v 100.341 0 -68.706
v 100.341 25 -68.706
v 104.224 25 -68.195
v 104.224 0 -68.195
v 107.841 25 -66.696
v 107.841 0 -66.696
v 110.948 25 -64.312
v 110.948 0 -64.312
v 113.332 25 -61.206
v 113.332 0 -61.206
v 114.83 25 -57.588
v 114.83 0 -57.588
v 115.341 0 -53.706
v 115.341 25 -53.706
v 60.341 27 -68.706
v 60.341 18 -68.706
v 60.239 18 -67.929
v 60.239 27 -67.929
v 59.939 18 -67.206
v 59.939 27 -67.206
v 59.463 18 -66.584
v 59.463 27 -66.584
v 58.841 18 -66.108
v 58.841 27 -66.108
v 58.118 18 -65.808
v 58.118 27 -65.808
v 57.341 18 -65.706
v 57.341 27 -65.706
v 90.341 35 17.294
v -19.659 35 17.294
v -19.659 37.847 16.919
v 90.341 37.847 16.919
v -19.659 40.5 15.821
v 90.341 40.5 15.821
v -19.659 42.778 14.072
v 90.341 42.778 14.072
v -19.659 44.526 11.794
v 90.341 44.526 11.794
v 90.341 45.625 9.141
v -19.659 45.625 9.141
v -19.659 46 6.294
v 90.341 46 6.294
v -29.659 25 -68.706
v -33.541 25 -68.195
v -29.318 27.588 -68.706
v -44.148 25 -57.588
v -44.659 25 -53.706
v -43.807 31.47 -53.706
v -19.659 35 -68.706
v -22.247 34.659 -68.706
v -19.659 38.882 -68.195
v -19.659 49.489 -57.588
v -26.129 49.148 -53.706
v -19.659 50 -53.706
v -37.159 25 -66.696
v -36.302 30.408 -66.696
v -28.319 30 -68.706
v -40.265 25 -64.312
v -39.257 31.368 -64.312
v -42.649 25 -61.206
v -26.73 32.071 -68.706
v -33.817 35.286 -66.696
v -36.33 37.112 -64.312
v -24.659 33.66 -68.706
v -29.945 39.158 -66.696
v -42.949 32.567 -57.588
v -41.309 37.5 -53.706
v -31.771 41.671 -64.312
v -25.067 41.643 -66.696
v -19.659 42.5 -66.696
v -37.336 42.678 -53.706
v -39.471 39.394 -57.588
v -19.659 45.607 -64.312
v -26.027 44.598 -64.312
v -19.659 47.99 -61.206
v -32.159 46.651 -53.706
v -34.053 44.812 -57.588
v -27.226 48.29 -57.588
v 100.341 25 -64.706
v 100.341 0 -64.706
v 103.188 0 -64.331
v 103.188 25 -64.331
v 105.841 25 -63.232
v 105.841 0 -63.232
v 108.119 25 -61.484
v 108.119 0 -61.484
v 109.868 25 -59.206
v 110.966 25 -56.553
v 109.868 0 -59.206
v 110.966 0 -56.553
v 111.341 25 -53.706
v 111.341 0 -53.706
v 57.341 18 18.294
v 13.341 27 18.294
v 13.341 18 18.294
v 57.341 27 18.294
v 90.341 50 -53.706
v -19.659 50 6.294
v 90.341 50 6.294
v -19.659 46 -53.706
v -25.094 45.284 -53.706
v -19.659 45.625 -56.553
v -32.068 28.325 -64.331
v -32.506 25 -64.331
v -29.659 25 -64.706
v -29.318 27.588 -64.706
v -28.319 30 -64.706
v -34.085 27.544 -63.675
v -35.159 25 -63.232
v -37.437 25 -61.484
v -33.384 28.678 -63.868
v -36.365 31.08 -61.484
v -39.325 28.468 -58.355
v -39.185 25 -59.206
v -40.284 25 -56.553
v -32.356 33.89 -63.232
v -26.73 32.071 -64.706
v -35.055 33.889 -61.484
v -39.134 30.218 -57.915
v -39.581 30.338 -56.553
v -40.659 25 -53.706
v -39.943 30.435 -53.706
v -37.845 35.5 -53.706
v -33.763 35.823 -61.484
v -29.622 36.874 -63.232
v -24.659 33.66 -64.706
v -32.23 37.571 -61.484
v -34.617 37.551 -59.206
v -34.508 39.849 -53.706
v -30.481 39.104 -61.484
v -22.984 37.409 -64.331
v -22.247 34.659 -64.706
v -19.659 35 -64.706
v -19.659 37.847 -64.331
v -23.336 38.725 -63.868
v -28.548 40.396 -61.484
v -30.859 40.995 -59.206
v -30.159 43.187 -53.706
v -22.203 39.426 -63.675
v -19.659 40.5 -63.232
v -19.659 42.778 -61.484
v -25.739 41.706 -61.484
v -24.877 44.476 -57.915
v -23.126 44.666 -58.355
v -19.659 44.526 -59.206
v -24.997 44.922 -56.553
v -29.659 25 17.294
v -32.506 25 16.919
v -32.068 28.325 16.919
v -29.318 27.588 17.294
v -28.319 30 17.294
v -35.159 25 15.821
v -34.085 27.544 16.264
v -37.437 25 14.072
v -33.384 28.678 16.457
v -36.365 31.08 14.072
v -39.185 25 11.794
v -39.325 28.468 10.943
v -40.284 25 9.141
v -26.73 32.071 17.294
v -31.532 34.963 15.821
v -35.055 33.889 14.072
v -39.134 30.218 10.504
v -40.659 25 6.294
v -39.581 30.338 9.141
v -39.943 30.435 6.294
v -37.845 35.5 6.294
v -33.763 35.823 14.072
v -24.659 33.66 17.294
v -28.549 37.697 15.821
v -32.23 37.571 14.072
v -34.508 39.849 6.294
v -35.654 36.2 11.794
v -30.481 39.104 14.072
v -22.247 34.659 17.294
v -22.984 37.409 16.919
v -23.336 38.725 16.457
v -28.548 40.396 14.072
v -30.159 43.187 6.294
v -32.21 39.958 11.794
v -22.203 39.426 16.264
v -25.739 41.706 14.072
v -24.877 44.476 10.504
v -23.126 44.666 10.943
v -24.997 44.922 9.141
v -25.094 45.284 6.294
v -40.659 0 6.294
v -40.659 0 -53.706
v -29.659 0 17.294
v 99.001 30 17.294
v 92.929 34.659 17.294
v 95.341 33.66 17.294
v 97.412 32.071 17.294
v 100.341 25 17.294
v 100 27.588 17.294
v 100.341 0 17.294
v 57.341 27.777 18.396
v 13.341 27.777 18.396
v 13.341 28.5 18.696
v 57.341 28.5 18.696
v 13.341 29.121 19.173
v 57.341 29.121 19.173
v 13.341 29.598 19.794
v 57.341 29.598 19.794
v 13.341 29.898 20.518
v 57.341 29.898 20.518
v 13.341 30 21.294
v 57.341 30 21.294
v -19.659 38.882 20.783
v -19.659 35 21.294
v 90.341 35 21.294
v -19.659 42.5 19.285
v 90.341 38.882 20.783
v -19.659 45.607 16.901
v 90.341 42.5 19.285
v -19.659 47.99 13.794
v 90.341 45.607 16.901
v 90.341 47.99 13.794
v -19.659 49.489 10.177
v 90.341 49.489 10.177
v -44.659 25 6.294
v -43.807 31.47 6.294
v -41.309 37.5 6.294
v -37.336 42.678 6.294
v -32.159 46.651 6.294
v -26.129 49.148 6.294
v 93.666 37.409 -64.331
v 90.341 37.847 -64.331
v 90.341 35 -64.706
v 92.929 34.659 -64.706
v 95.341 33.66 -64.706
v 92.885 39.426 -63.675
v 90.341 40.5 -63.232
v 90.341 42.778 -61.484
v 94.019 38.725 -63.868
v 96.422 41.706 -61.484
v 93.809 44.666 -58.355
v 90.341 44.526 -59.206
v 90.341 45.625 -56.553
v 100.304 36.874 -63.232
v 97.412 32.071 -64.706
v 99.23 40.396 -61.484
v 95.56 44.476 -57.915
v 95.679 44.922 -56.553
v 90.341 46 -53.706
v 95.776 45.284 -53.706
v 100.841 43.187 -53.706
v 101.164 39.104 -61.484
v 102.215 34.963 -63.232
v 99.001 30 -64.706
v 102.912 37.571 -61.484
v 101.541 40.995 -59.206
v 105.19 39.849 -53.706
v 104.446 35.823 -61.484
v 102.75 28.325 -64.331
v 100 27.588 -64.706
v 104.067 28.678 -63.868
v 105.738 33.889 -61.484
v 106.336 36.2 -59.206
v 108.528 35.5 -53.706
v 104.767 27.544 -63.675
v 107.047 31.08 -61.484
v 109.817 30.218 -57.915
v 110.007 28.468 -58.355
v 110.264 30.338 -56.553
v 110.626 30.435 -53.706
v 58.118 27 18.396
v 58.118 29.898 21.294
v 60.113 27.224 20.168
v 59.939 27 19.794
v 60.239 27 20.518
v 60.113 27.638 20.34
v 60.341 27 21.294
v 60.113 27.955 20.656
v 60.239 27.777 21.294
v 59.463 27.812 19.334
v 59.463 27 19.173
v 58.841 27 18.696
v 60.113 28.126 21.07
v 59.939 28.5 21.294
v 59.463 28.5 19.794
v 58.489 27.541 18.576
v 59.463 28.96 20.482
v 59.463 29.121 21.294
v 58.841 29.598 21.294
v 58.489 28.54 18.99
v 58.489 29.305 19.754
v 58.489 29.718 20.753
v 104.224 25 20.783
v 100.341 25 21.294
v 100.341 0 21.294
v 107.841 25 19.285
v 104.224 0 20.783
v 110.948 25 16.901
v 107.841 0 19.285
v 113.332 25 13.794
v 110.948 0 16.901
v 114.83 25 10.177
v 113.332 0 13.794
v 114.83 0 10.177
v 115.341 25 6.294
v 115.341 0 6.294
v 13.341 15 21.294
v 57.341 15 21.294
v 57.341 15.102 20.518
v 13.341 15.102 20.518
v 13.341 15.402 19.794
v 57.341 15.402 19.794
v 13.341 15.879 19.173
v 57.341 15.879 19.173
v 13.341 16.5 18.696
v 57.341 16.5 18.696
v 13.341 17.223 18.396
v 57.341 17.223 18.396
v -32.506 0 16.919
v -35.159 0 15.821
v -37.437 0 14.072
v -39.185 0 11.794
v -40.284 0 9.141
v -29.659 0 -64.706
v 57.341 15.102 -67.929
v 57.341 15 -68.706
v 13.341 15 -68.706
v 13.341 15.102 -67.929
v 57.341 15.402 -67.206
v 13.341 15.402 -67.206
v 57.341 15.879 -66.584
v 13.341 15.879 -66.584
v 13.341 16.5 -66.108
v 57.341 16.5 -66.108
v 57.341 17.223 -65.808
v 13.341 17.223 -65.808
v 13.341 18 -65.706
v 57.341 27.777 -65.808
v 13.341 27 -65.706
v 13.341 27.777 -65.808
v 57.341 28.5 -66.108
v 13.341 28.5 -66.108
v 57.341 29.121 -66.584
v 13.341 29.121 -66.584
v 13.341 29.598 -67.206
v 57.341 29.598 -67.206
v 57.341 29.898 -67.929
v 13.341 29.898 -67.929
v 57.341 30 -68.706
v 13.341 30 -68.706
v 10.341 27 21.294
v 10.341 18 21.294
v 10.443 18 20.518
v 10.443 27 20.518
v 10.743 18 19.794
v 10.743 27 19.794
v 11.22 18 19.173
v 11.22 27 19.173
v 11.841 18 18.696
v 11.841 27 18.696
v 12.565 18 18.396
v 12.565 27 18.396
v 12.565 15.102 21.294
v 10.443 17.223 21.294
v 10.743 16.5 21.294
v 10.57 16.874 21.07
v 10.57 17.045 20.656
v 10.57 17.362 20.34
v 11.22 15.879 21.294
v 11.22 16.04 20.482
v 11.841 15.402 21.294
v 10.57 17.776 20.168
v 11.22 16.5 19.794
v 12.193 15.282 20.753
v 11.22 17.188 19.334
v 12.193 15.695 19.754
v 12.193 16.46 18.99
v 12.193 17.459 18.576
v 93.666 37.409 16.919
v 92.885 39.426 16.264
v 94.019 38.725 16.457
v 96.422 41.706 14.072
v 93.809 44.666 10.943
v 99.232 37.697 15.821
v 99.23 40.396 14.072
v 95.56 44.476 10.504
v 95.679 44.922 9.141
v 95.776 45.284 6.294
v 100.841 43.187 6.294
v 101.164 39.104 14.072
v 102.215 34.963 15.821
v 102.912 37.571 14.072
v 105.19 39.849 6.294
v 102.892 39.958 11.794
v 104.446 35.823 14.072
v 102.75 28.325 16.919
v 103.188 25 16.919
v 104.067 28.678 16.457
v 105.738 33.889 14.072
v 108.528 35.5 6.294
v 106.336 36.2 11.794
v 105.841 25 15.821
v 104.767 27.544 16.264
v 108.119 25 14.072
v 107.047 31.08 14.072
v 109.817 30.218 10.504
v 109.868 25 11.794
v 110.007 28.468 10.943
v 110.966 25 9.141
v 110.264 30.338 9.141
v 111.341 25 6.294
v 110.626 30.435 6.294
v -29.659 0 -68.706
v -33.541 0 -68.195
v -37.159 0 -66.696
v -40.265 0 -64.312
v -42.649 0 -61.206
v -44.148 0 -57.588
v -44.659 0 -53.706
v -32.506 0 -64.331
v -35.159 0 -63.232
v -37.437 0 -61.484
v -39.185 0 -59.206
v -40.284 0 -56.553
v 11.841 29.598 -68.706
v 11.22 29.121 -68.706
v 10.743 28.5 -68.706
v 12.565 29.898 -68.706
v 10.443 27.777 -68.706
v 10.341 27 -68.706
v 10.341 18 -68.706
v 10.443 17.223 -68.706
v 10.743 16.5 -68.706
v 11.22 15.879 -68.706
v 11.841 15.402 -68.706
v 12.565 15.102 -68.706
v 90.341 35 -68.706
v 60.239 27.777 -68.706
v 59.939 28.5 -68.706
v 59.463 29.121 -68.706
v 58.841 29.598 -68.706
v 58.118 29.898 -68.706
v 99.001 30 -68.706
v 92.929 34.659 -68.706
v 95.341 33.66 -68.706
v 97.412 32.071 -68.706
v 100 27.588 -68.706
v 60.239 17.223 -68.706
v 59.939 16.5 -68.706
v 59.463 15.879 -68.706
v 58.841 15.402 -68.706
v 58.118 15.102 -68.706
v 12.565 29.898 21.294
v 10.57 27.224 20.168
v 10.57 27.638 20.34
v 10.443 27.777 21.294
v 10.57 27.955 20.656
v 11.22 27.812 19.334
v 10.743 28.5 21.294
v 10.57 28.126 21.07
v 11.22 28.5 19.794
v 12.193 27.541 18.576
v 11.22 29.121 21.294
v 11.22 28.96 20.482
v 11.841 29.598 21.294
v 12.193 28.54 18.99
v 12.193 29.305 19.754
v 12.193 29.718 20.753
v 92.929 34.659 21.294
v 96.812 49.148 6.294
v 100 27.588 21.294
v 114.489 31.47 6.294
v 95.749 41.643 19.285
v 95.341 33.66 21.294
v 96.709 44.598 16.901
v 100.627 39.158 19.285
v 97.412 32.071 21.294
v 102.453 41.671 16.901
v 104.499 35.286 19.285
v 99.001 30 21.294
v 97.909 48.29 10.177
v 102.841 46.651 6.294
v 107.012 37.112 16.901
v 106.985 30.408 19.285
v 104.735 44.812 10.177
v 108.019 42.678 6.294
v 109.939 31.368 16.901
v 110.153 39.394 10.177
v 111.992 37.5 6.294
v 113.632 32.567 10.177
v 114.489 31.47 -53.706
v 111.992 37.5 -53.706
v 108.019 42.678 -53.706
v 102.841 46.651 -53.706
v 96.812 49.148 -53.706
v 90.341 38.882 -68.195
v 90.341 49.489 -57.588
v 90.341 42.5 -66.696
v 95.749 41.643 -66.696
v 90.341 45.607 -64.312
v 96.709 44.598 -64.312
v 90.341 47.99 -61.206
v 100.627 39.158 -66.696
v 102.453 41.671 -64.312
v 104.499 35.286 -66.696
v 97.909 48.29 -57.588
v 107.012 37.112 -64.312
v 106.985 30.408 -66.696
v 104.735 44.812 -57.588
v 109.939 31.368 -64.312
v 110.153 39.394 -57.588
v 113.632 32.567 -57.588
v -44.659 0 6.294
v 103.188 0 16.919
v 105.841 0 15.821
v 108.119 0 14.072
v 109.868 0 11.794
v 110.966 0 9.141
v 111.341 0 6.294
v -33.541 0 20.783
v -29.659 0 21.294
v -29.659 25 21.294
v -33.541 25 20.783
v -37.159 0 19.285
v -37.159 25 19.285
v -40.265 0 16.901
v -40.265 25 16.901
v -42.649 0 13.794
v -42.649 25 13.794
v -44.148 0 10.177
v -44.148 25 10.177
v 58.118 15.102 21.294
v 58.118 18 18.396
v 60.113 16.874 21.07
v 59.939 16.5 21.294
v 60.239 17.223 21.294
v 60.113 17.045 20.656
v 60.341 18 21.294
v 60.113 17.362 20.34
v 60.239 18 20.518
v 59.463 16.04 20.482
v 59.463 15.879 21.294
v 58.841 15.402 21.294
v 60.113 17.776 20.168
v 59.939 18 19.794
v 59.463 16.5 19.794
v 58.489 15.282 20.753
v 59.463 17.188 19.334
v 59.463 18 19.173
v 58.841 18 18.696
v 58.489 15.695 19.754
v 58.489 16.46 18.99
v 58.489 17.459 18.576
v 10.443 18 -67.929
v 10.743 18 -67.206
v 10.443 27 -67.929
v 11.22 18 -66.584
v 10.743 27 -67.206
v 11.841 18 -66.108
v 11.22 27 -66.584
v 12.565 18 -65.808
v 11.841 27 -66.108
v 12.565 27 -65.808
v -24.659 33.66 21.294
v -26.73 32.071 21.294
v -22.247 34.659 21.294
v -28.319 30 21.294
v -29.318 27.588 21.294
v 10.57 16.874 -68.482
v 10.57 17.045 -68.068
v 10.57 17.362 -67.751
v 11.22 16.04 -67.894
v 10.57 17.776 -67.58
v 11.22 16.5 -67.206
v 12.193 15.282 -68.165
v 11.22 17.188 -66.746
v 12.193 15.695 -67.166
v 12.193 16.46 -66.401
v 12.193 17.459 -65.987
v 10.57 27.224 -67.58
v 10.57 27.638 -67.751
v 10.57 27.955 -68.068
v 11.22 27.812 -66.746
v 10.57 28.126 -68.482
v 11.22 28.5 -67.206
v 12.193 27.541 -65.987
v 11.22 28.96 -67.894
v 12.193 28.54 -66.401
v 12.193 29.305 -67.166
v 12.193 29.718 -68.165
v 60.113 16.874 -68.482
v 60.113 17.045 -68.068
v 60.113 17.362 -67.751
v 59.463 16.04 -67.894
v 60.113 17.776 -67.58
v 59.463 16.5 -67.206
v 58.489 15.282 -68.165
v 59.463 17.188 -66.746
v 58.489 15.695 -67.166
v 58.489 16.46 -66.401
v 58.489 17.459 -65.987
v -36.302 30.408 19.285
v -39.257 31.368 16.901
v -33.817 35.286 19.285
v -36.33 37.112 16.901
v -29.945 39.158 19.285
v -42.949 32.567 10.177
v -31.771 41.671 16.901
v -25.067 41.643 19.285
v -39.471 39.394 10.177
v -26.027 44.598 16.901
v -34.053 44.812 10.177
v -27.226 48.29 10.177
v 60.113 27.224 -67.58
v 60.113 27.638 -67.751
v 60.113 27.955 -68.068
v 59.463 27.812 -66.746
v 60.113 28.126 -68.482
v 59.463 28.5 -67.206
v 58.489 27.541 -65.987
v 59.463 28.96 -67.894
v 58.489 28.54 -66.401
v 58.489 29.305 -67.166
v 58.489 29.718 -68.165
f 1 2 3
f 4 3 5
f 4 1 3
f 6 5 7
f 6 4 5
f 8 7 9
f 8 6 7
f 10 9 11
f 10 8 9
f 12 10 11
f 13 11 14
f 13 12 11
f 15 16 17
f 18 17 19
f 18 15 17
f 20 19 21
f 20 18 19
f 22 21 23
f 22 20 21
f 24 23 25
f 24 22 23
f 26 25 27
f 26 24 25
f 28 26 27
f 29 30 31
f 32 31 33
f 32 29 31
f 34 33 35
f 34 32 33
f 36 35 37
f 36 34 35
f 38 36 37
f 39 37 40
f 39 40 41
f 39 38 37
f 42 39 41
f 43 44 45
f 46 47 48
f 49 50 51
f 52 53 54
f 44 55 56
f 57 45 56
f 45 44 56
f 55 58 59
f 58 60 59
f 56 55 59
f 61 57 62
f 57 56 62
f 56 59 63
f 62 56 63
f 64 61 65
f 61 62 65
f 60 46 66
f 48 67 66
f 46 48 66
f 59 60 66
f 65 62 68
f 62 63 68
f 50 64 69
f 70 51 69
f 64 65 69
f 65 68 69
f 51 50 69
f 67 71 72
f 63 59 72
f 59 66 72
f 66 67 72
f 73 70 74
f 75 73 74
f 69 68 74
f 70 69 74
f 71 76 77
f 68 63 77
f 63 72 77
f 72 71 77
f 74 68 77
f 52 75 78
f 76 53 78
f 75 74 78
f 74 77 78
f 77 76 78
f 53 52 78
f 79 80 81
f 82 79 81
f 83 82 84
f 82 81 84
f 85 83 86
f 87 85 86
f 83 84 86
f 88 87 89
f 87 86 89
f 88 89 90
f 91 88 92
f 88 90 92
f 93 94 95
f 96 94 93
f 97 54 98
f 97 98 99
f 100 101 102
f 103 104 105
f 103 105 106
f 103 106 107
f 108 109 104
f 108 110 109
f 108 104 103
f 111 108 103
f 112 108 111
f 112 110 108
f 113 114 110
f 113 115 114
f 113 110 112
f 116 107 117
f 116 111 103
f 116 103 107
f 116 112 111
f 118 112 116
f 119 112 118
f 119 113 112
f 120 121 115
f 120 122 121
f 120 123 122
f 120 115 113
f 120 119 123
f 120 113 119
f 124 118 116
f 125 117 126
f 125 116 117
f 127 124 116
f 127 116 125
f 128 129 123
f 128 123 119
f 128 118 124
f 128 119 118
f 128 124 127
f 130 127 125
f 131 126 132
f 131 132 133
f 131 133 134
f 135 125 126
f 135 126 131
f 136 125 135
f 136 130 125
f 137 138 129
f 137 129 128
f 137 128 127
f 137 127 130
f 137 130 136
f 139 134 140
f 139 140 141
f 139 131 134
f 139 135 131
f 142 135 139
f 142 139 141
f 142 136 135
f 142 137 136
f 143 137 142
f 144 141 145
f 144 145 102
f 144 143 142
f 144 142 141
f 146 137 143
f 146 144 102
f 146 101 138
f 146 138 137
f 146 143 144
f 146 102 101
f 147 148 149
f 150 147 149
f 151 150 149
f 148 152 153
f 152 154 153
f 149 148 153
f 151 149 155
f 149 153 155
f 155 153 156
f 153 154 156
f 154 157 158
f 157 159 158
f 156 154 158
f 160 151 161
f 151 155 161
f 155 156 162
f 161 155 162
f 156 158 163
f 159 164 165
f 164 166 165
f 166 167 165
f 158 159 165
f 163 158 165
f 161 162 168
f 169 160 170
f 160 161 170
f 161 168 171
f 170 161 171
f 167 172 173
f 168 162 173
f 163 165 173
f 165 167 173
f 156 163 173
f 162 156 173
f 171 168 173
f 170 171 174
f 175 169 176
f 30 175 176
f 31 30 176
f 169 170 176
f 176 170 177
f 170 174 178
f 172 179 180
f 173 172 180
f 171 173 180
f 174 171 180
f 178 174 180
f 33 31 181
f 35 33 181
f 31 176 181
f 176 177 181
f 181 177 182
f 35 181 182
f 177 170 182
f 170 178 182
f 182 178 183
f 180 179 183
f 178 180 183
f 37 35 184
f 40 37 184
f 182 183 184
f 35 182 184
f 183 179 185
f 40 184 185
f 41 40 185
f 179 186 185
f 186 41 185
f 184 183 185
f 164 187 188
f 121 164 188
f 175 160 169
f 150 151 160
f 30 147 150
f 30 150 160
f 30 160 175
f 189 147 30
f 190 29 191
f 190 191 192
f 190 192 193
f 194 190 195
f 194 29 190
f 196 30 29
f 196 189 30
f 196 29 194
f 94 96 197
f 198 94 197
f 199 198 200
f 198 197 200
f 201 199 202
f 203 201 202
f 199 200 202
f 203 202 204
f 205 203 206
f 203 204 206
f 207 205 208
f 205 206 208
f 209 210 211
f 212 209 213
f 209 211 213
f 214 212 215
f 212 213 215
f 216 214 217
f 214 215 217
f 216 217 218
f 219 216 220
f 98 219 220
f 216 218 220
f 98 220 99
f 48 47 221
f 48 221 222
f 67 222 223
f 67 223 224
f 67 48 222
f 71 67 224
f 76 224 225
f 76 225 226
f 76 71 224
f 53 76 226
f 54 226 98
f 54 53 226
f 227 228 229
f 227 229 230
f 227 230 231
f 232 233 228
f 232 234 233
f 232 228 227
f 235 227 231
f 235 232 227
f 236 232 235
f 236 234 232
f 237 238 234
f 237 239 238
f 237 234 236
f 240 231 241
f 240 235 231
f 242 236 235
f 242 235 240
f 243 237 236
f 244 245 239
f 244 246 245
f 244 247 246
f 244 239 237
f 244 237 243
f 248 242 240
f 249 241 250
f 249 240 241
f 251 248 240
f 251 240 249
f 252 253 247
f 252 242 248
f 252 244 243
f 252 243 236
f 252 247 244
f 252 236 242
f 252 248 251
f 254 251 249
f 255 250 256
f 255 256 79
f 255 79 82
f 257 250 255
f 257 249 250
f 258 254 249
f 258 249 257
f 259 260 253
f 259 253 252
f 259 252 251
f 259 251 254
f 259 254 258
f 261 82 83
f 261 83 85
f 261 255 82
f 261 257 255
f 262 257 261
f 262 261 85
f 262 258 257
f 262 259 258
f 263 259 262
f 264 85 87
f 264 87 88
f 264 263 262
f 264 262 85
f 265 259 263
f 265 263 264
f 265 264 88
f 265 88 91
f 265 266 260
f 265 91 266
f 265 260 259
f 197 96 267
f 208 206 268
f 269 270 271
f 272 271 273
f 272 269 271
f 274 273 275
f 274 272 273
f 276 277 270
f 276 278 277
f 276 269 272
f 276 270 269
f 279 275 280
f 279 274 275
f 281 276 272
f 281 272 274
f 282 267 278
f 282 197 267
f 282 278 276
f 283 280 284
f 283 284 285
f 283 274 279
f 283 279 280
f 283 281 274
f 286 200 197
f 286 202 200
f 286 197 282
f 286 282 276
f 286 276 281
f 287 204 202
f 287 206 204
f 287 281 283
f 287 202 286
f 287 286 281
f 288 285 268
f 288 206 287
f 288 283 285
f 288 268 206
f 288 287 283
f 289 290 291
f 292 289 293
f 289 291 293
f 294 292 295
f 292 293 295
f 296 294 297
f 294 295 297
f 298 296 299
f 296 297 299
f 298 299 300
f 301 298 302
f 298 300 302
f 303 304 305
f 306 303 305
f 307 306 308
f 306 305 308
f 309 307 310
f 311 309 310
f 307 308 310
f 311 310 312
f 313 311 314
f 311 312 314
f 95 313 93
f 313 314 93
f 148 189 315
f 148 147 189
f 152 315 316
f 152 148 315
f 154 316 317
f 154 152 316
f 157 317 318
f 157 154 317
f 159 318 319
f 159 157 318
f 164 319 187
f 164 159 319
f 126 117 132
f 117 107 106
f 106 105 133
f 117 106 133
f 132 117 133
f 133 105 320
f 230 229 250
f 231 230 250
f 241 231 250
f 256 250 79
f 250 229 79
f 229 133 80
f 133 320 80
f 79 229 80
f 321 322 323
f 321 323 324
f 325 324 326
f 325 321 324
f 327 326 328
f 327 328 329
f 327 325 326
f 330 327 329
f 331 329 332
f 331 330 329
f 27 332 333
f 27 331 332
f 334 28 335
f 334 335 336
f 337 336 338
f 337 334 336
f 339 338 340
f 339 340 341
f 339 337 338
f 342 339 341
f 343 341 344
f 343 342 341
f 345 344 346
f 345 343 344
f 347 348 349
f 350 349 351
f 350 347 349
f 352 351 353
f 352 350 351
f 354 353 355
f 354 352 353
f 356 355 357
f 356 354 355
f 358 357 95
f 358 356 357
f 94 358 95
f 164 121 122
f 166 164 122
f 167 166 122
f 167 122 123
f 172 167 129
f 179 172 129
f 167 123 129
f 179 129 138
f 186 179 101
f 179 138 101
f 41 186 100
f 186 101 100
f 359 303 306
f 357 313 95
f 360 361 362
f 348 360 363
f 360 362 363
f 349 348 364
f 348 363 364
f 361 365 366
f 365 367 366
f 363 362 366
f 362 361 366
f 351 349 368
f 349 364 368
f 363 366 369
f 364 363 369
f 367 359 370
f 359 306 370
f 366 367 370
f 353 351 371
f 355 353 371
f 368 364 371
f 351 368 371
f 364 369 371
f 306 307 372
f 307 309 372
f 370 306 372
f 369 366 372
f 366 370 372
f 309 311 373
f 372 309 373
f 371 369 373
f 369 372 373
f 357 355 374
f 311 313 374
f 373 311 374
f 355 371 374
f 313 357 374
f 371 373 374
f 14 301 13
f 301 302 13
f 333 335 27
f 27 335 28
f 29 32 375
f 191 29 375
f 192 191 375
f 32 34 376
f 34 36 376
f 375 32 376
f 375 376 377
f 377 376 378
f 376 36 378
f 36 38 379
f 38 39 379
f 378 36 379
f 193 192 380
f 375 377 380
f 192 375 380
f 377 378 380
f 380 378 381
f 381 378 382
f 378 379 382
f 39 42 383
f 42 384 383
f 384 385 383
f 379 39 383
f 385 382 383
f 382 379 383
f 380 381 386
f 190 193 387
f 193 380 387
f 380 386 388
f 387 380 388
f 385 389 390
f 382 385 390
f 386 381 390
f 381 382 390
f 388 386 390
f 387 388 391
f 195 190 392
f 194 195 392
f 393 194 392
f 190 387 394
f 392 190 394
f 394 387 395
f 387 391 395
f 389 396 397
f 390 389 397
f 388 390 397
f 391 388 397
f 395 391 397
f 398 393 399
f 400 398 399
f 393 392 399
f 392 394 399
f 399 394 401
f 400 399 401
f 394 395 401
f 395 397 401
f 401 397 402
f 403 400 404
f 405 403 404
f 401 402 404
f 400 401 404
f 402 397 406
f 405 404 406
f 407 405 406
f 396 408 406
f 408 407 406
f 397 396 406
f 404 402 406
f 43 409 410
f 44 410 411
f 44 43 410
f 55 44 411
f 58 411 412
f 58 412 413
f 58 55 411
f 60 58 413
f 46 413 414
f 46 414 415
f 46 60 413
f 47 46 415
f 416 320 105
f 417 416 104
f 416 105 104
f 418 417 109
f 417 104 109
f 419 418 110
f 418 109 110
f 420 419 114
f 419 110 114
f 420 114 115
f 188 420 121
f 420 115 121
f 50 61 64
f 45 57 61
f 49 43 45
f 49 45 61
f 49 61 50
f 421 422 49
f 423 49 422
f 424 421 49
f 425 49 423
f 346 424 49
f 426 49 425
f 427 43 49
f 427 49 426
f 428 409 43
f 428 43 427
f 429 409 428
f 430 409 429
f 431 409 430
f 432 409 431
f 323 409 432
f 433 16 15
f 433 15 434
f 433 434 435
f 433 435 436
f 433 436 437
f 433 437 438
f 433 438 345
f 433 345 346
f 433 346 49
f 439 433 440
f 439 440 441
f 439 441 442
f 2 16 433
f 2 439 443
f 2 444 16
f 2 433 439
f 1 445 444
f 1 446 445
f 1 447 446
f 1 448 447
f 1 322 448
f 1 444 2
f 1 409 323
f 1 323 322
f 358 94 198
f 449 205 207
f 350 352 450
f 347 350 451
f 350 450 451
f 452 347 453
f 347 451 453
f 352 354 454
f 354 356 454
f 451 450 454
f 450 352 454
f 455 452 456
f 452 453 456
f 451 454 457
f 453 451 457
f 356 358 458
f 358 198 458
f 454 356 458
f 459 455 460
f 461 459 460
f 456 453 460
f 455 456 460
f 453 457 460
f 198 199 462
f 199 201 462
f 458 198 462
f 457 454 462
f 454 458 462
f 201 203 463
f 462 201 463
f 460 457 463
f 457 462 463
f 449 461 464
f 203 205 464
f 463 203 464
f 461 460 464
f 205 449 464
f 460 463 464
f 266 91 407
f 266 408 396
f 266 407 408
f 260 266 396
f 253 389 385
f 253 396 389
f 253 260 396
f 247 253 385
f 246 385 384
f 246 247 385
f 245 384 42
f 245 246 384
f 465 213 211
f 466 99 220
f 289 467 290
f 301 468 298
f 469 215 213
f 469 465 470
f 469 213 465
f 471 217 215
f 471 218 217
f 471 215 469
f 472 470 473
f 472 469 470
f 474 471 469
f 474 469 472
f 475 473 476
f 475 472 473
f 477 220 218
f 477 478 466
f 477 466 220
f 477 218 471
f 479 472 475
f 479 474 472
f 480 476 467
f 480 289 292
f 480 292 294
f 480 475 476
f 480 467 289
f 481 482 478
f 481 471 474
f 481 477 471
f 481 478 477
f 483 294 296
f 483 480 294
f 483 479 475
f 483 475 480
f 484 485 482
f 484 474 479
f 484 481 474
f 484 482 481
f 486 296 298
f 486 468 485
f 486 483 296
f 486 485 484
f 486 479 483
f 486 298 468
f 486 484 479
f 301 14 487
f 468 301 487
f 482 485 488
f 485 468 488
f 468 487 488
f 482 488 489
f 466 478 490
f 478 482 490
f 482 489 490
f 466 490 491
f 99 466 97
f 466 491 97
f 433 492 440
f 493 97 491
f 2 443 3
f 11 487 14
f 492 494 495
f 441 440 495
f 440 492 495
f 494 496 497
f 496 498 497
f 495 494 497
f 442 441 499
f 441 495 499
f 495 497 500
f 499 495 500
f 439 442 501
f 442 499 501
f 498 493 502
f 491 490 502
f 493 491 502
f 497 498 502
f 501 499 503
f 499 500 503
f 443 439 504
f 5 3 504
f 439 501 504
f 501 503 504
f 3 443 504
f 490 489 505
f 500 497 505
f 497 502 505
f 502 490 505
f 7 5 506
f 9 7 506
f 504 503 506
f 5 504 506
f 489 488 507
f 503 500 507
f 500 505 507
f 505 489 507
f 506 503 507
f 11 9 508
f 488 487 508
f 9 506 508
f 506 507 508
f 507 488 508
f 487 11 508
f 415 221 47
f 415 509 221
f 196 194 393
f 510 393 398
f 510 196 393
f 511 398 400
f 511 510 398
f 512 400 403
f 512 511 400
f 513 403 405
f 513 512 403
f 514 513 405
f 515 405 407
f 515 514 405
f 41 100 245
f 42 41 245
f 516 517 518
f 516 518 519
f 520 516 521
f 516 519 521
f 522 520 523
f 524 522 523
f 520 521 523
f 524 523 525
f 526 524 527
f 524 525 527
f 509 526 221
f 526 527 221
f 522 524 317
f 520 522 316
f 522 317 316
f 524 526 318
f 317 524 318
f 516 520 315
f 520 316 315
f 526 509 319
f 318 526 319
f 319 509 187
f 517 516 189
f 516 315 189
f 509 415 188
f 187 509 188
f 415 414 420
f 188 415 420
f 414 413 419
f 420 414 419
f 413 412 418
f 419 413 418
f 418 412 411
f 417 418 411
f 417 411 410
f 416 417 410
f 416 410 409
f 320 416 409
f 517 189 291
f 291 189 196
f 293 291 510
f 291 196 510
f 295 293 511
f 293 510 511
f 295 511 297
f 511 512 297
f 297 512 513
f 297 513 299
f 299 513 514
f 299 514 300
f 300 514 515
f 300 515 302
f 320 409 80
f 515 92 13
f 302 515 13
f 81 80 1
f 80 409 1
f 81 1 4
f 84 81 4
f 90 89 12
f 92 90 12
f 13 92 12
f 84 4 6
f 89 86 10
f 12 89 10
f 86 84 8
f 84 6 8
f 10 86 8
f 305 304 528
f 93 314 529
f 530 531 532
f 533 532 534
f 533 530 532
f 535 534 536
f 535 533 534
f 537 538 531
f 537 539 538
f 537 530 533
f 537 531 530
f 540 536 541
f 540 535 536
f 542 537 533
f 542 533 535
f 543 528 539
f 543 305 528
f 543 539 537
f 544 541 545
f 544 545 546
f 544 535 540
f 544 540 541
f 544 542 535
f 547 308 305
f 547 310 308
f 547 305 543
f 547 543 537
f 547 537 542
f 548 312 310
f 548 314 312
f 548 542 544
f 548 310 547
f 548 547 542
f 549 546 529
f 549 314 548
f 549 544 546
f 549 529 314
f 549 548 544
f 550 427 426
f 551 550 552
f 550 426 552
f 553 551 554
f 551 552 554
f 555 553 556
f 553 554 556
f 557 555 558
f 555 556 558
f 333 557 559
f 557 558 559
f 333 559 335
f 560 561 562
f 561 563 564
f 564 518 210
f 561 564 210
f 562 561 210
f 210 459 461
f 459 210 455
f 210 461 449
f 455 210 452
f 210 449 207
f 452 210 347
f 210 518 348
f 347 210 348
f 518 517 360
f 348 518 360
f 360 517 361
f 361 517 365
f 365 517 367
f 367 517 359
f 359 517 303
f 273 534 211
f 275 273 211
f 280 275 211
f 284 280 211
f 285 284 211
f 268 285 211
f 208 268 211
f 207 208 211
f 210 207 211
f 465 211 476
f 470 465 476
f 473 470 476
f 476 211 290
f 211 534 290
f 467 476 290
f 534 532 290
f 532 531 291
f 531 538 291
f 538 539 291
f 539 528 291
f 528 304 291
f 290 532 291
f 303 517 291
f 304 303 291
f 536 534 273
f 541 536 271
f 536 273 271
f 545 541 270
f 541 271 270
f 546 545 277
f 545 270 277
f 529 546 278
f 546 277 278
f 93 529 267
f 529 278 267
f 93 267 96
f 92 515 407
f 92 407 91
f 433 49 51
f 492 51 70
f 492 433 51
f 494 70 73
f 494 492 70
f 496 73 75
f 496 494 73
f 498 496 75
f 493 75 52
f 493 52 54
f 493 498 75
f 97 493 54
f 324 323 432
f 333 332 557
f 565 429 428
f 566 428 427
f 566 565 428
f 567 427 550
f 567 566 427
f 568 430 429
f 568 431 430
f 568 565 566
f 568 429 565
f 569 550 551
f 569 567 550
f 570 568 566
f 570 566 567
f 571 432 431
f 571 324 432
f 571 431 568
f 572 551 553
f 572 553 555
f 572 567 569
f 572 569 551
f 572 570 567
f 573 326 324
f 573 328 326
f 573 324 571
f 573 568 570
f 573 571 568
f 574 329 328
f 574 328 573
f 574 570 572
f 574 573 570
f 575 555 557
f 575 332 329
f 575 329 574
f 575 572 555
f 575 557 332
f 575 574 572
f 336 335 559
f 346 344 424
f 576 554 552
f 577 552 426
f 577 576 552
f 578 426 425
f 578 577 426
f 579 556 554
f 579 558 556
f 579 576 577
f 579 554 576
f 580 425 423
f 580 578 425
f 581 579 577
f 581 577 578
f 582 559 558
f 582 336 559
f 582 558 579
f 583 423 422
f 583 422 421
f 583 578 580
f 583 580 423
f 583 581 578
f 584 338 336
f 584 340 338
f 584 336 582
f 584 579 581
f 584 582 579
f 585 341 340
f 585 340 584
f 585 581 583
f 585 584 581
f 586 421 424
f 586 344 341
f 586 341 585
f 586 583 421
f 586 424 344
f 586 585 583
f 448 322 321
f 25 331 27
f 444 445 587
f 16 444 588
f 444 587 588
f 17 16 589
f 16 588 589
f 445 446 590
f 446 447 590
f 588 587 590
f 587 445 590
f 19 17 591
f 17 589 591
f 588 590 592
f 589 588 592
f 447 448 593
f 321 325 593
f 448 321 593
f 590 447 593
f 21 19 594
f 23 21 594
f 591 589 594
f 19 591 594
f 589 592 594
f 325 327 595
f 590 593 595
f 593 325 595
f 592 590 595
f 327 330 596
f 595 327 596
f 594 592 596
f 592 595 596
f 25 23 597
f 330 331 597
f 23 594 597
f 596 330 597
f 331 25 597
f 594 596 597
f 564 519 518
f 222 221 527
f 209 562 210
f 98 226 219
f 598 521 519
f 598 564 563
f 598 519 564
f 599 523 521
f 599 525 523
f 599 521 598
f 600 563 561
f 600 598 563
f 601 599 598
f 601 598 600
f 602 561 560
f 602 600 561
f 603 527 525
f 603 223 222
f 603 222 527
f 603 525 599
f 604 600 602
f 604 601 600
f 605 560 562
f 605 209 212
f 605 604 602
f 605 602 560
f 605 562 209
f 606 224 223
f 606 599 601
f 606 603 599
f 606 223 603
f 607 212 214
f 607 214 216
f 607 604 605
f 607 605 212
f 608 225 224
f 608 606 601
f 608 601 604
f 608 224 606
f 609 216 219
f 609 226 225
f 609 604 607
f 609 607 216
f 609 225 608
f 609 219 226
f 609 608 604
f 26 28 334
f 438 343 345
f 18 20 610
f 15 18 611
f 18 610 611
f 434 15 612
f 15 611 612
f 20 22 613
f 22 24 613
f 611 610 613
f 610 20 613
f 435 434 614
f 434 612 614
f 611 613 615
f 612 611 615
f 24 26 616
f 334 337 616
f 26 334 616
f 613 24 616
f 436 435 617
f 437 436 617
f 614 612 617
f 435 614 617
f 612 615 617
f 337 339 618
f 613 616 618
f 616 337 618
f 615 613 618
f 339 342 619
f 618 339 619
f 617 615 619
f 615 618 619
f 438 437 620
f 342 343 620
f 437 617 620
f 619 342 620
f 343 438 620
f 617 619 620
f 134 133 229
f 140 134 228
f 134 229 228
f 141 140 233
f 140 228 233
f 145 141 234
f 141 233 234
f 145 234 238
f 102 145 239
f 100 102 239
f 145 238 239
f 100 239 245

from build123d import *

# Parameters (mm, degrees)
ESQUISSE1_W             = 160
ESQUISSE1_H             = 90
EXTRUSION1_DEPTH        = 50
CONG_1_R                = 25
CONG_2_R                = 15
COQUE1_T                = -4
ESQUISSE2_W             = 50
ESQUISSE2_H             = 15
ENL_V_MAT_EXTRU_1_DEPTH = 3
CONG_4_R                = 3
CONG_5_R                = 3
CONG_6_R                = 3
CONG_7_R                = 3
CONG_4_OF_SYM_TRIE1_R   = 3
CONG_5_OF_SYM_TRIE1_R   = 3
CONG_6_OF_SYM_TRIE1_R   = 3
CONG_7_OF_SYM_TRIE1_R   = 3


with BuildPart() as part:
    # Esquisse1 → Extrusion1 (new body)
    with BuildSketch(Plane(origin=(0, 0, 0), x_dir=(1, 0, 0), z_dir=(0, 1, 0))):
        with Locations((35.341232877, 23.705753425)):
            Rectangle(ESQUISSE1_W, ESQUISSE1_H)
    extrude(amount=EXTRUSION1_DEPTH)

    # Congé1
    cong_1_edges = [part.edges().sort_by_distance(p)[0] for p in [
        (115.341232877, 50, -23.705753425),
        (-44.658767123, 50, -23.705753425),
    ]]
    fillet(cong_1_edges, radius=CONG_1_R)

    # Congé2
    cong_2_edges = [part.edges().sort_by_distance(p)[0] for p in [
        (35.341232877, 50, 21.294246575),
        (35.341232877, 50, -68.705753425),
        (115.341232877, 12.5, 21.294246575),
        (-44.658767123, 12.5, 21.294246575),
        (108.018902406, 42.67766953, 21.294246575),
        (-37.336436653, 42.67766953, 21.294246575),
        (-44.658767123, 12.5, -68.705753425),
        (115.341232877, 12.5, -68.705753425),
        (108.018902406, 42.67766953, -68.705753425),
        (-37.336436653, 42.67766953, -68.705753425),
    ]]
    fillet(cong_2_edges, radius=CONG_2_R)

    # Coque1
    coque1_openings = [part.faces().sort_by_distance(p)[0] for p in [
        (35.341232877, 0, -23.705753425),
    ]]
    offset(amount=COQUE1_T, openings=coque1_openings, kind=Kind.INTERSECTION)

    # Esquisse2 → Enlèv. mat.-Extru.1 (cut)
    with BuildSketch(Plane.XY.offset(21.294246575)):
        with Locations((35.341232877, 22.5)):
            Rectangle(ESQUISSE2_W, ESQUISSE2_H)
    enl_v_mat_extru_1 = extrude(amount=-ENL_V_MAT_EXTRU_1_DEPTH, mode=Mode.SUBTRACT)

    # Congé4
    cong_4_edges = [part.edges().sort_by_distance(p)[0] for p in [
        (35.341232877, 15, 18.294246575),
    ]]
    fillet(cong_4_edges, radius=CONG_4_R - 0.0001)  # a hair under: the kernel refuses the full size

    # Congé5
    cong_5_edges = [part.edges().sort_by_distance(p)[0] for p in [
        (35.341232877, 30, 18.294246575),
    ]]
    fillet(cong_5_edges, radius=CONG_5_R - 0.0001)  # a hair under: the kernel refuses the full size

    # Congé6
    cong_6_edges = [part.edges().sort_by_distance(p)[0] for p in [
        (10.341232877, 15.878650367, 19.172896942),
        (10.341232877, 22.5, 18.294246575),
        (10.341232877, 29.121349633, 19.172896942),
    ]]
    fillet(cong_6_edges, radius=CONG_6_R - 0.0001)  # a hair under: the kernel refuses the full size

    # Congé7
    cong_7_edges = [part.edges().sort_by_distance(p)[0] for p in [
        (60.341232877, 22.5, 18.294246575),
        (60.341232877, 15.878650367, 19.172896942),
        (60.341232877, 29.121349633, 19.172896942),
    ]]
    fillet(cong_7_edges, radius=CONG_7_R - 0.0001)  # a hair under: the kernel refuses the full size

    # Symétrie1: Enlèv. mat.-Extru.1 across plane
    add(enl_v_mat_extru_1.mirror(Plane.XY.offset(-23.705753425)), mode=Mode.SUBTRACT)

    # Congé4 of Symétrie1
    cong_4_of_sym_trie1_edges = [part.edges().sort_by_distance(p)[0] for p in [
        (35.341232877, 15, -65.705753425),
    ]]
    fillet(cong_4_of_sym_trie1_edges, radius=CONG_4_OF_SYM_TRIE1_R - 0.0001)  # a hair under: the kernel refuses the full size

    # Congé5 of Symétrie1
    cong_5_of_sym_trie1_edges = [part.edges().sort_by_distance(p)[0] for p in [
        (35.341232877, 30, -65.705753425),
    ]]
    fillet(cong_5_of_sym_trie1_edges, radius=CONG_5_OF_SYM_TRIE1_R - 0.0001)  # a hair under: the kernel refuses the full size

    # Congé6 of Symétrie1
    cong_6_of_sym_trie1_edges = [part.edges().sort_by_distance(p)[0] for p in [
        (10.341232877, 15.878650367, -66.584403792),
        (10.341232877, 22.5, -65.705753425),
        (10.341232877, 29.121349633, -66.584403792),
    ]]
    fillet(cong_6_of_sym_trie1_edges, radius=CONG_6_OF_SYM_TRIE1_R - 0.0001)  # a hair under: the kernel refuses the full size

    # Congé7 of Symétrie1
    cong_7_of_sym_trie1_edges = [part.edges().sort_by_distance(p)[0] for p in [
        (60.341232877, 22.5, -65.705753425),
        (60.341232877, 15.878650367, -66.584403792),
        (60.341232877, 29.121349633, -66.584403792),
    ]]
    fillet(cong_7_of_sym_trie1_edges, radius=CONG_7_OF_SYM_TRIE1_R - 0.0001)  # a hair under: the kernel refuses the full size


solid = part.part
